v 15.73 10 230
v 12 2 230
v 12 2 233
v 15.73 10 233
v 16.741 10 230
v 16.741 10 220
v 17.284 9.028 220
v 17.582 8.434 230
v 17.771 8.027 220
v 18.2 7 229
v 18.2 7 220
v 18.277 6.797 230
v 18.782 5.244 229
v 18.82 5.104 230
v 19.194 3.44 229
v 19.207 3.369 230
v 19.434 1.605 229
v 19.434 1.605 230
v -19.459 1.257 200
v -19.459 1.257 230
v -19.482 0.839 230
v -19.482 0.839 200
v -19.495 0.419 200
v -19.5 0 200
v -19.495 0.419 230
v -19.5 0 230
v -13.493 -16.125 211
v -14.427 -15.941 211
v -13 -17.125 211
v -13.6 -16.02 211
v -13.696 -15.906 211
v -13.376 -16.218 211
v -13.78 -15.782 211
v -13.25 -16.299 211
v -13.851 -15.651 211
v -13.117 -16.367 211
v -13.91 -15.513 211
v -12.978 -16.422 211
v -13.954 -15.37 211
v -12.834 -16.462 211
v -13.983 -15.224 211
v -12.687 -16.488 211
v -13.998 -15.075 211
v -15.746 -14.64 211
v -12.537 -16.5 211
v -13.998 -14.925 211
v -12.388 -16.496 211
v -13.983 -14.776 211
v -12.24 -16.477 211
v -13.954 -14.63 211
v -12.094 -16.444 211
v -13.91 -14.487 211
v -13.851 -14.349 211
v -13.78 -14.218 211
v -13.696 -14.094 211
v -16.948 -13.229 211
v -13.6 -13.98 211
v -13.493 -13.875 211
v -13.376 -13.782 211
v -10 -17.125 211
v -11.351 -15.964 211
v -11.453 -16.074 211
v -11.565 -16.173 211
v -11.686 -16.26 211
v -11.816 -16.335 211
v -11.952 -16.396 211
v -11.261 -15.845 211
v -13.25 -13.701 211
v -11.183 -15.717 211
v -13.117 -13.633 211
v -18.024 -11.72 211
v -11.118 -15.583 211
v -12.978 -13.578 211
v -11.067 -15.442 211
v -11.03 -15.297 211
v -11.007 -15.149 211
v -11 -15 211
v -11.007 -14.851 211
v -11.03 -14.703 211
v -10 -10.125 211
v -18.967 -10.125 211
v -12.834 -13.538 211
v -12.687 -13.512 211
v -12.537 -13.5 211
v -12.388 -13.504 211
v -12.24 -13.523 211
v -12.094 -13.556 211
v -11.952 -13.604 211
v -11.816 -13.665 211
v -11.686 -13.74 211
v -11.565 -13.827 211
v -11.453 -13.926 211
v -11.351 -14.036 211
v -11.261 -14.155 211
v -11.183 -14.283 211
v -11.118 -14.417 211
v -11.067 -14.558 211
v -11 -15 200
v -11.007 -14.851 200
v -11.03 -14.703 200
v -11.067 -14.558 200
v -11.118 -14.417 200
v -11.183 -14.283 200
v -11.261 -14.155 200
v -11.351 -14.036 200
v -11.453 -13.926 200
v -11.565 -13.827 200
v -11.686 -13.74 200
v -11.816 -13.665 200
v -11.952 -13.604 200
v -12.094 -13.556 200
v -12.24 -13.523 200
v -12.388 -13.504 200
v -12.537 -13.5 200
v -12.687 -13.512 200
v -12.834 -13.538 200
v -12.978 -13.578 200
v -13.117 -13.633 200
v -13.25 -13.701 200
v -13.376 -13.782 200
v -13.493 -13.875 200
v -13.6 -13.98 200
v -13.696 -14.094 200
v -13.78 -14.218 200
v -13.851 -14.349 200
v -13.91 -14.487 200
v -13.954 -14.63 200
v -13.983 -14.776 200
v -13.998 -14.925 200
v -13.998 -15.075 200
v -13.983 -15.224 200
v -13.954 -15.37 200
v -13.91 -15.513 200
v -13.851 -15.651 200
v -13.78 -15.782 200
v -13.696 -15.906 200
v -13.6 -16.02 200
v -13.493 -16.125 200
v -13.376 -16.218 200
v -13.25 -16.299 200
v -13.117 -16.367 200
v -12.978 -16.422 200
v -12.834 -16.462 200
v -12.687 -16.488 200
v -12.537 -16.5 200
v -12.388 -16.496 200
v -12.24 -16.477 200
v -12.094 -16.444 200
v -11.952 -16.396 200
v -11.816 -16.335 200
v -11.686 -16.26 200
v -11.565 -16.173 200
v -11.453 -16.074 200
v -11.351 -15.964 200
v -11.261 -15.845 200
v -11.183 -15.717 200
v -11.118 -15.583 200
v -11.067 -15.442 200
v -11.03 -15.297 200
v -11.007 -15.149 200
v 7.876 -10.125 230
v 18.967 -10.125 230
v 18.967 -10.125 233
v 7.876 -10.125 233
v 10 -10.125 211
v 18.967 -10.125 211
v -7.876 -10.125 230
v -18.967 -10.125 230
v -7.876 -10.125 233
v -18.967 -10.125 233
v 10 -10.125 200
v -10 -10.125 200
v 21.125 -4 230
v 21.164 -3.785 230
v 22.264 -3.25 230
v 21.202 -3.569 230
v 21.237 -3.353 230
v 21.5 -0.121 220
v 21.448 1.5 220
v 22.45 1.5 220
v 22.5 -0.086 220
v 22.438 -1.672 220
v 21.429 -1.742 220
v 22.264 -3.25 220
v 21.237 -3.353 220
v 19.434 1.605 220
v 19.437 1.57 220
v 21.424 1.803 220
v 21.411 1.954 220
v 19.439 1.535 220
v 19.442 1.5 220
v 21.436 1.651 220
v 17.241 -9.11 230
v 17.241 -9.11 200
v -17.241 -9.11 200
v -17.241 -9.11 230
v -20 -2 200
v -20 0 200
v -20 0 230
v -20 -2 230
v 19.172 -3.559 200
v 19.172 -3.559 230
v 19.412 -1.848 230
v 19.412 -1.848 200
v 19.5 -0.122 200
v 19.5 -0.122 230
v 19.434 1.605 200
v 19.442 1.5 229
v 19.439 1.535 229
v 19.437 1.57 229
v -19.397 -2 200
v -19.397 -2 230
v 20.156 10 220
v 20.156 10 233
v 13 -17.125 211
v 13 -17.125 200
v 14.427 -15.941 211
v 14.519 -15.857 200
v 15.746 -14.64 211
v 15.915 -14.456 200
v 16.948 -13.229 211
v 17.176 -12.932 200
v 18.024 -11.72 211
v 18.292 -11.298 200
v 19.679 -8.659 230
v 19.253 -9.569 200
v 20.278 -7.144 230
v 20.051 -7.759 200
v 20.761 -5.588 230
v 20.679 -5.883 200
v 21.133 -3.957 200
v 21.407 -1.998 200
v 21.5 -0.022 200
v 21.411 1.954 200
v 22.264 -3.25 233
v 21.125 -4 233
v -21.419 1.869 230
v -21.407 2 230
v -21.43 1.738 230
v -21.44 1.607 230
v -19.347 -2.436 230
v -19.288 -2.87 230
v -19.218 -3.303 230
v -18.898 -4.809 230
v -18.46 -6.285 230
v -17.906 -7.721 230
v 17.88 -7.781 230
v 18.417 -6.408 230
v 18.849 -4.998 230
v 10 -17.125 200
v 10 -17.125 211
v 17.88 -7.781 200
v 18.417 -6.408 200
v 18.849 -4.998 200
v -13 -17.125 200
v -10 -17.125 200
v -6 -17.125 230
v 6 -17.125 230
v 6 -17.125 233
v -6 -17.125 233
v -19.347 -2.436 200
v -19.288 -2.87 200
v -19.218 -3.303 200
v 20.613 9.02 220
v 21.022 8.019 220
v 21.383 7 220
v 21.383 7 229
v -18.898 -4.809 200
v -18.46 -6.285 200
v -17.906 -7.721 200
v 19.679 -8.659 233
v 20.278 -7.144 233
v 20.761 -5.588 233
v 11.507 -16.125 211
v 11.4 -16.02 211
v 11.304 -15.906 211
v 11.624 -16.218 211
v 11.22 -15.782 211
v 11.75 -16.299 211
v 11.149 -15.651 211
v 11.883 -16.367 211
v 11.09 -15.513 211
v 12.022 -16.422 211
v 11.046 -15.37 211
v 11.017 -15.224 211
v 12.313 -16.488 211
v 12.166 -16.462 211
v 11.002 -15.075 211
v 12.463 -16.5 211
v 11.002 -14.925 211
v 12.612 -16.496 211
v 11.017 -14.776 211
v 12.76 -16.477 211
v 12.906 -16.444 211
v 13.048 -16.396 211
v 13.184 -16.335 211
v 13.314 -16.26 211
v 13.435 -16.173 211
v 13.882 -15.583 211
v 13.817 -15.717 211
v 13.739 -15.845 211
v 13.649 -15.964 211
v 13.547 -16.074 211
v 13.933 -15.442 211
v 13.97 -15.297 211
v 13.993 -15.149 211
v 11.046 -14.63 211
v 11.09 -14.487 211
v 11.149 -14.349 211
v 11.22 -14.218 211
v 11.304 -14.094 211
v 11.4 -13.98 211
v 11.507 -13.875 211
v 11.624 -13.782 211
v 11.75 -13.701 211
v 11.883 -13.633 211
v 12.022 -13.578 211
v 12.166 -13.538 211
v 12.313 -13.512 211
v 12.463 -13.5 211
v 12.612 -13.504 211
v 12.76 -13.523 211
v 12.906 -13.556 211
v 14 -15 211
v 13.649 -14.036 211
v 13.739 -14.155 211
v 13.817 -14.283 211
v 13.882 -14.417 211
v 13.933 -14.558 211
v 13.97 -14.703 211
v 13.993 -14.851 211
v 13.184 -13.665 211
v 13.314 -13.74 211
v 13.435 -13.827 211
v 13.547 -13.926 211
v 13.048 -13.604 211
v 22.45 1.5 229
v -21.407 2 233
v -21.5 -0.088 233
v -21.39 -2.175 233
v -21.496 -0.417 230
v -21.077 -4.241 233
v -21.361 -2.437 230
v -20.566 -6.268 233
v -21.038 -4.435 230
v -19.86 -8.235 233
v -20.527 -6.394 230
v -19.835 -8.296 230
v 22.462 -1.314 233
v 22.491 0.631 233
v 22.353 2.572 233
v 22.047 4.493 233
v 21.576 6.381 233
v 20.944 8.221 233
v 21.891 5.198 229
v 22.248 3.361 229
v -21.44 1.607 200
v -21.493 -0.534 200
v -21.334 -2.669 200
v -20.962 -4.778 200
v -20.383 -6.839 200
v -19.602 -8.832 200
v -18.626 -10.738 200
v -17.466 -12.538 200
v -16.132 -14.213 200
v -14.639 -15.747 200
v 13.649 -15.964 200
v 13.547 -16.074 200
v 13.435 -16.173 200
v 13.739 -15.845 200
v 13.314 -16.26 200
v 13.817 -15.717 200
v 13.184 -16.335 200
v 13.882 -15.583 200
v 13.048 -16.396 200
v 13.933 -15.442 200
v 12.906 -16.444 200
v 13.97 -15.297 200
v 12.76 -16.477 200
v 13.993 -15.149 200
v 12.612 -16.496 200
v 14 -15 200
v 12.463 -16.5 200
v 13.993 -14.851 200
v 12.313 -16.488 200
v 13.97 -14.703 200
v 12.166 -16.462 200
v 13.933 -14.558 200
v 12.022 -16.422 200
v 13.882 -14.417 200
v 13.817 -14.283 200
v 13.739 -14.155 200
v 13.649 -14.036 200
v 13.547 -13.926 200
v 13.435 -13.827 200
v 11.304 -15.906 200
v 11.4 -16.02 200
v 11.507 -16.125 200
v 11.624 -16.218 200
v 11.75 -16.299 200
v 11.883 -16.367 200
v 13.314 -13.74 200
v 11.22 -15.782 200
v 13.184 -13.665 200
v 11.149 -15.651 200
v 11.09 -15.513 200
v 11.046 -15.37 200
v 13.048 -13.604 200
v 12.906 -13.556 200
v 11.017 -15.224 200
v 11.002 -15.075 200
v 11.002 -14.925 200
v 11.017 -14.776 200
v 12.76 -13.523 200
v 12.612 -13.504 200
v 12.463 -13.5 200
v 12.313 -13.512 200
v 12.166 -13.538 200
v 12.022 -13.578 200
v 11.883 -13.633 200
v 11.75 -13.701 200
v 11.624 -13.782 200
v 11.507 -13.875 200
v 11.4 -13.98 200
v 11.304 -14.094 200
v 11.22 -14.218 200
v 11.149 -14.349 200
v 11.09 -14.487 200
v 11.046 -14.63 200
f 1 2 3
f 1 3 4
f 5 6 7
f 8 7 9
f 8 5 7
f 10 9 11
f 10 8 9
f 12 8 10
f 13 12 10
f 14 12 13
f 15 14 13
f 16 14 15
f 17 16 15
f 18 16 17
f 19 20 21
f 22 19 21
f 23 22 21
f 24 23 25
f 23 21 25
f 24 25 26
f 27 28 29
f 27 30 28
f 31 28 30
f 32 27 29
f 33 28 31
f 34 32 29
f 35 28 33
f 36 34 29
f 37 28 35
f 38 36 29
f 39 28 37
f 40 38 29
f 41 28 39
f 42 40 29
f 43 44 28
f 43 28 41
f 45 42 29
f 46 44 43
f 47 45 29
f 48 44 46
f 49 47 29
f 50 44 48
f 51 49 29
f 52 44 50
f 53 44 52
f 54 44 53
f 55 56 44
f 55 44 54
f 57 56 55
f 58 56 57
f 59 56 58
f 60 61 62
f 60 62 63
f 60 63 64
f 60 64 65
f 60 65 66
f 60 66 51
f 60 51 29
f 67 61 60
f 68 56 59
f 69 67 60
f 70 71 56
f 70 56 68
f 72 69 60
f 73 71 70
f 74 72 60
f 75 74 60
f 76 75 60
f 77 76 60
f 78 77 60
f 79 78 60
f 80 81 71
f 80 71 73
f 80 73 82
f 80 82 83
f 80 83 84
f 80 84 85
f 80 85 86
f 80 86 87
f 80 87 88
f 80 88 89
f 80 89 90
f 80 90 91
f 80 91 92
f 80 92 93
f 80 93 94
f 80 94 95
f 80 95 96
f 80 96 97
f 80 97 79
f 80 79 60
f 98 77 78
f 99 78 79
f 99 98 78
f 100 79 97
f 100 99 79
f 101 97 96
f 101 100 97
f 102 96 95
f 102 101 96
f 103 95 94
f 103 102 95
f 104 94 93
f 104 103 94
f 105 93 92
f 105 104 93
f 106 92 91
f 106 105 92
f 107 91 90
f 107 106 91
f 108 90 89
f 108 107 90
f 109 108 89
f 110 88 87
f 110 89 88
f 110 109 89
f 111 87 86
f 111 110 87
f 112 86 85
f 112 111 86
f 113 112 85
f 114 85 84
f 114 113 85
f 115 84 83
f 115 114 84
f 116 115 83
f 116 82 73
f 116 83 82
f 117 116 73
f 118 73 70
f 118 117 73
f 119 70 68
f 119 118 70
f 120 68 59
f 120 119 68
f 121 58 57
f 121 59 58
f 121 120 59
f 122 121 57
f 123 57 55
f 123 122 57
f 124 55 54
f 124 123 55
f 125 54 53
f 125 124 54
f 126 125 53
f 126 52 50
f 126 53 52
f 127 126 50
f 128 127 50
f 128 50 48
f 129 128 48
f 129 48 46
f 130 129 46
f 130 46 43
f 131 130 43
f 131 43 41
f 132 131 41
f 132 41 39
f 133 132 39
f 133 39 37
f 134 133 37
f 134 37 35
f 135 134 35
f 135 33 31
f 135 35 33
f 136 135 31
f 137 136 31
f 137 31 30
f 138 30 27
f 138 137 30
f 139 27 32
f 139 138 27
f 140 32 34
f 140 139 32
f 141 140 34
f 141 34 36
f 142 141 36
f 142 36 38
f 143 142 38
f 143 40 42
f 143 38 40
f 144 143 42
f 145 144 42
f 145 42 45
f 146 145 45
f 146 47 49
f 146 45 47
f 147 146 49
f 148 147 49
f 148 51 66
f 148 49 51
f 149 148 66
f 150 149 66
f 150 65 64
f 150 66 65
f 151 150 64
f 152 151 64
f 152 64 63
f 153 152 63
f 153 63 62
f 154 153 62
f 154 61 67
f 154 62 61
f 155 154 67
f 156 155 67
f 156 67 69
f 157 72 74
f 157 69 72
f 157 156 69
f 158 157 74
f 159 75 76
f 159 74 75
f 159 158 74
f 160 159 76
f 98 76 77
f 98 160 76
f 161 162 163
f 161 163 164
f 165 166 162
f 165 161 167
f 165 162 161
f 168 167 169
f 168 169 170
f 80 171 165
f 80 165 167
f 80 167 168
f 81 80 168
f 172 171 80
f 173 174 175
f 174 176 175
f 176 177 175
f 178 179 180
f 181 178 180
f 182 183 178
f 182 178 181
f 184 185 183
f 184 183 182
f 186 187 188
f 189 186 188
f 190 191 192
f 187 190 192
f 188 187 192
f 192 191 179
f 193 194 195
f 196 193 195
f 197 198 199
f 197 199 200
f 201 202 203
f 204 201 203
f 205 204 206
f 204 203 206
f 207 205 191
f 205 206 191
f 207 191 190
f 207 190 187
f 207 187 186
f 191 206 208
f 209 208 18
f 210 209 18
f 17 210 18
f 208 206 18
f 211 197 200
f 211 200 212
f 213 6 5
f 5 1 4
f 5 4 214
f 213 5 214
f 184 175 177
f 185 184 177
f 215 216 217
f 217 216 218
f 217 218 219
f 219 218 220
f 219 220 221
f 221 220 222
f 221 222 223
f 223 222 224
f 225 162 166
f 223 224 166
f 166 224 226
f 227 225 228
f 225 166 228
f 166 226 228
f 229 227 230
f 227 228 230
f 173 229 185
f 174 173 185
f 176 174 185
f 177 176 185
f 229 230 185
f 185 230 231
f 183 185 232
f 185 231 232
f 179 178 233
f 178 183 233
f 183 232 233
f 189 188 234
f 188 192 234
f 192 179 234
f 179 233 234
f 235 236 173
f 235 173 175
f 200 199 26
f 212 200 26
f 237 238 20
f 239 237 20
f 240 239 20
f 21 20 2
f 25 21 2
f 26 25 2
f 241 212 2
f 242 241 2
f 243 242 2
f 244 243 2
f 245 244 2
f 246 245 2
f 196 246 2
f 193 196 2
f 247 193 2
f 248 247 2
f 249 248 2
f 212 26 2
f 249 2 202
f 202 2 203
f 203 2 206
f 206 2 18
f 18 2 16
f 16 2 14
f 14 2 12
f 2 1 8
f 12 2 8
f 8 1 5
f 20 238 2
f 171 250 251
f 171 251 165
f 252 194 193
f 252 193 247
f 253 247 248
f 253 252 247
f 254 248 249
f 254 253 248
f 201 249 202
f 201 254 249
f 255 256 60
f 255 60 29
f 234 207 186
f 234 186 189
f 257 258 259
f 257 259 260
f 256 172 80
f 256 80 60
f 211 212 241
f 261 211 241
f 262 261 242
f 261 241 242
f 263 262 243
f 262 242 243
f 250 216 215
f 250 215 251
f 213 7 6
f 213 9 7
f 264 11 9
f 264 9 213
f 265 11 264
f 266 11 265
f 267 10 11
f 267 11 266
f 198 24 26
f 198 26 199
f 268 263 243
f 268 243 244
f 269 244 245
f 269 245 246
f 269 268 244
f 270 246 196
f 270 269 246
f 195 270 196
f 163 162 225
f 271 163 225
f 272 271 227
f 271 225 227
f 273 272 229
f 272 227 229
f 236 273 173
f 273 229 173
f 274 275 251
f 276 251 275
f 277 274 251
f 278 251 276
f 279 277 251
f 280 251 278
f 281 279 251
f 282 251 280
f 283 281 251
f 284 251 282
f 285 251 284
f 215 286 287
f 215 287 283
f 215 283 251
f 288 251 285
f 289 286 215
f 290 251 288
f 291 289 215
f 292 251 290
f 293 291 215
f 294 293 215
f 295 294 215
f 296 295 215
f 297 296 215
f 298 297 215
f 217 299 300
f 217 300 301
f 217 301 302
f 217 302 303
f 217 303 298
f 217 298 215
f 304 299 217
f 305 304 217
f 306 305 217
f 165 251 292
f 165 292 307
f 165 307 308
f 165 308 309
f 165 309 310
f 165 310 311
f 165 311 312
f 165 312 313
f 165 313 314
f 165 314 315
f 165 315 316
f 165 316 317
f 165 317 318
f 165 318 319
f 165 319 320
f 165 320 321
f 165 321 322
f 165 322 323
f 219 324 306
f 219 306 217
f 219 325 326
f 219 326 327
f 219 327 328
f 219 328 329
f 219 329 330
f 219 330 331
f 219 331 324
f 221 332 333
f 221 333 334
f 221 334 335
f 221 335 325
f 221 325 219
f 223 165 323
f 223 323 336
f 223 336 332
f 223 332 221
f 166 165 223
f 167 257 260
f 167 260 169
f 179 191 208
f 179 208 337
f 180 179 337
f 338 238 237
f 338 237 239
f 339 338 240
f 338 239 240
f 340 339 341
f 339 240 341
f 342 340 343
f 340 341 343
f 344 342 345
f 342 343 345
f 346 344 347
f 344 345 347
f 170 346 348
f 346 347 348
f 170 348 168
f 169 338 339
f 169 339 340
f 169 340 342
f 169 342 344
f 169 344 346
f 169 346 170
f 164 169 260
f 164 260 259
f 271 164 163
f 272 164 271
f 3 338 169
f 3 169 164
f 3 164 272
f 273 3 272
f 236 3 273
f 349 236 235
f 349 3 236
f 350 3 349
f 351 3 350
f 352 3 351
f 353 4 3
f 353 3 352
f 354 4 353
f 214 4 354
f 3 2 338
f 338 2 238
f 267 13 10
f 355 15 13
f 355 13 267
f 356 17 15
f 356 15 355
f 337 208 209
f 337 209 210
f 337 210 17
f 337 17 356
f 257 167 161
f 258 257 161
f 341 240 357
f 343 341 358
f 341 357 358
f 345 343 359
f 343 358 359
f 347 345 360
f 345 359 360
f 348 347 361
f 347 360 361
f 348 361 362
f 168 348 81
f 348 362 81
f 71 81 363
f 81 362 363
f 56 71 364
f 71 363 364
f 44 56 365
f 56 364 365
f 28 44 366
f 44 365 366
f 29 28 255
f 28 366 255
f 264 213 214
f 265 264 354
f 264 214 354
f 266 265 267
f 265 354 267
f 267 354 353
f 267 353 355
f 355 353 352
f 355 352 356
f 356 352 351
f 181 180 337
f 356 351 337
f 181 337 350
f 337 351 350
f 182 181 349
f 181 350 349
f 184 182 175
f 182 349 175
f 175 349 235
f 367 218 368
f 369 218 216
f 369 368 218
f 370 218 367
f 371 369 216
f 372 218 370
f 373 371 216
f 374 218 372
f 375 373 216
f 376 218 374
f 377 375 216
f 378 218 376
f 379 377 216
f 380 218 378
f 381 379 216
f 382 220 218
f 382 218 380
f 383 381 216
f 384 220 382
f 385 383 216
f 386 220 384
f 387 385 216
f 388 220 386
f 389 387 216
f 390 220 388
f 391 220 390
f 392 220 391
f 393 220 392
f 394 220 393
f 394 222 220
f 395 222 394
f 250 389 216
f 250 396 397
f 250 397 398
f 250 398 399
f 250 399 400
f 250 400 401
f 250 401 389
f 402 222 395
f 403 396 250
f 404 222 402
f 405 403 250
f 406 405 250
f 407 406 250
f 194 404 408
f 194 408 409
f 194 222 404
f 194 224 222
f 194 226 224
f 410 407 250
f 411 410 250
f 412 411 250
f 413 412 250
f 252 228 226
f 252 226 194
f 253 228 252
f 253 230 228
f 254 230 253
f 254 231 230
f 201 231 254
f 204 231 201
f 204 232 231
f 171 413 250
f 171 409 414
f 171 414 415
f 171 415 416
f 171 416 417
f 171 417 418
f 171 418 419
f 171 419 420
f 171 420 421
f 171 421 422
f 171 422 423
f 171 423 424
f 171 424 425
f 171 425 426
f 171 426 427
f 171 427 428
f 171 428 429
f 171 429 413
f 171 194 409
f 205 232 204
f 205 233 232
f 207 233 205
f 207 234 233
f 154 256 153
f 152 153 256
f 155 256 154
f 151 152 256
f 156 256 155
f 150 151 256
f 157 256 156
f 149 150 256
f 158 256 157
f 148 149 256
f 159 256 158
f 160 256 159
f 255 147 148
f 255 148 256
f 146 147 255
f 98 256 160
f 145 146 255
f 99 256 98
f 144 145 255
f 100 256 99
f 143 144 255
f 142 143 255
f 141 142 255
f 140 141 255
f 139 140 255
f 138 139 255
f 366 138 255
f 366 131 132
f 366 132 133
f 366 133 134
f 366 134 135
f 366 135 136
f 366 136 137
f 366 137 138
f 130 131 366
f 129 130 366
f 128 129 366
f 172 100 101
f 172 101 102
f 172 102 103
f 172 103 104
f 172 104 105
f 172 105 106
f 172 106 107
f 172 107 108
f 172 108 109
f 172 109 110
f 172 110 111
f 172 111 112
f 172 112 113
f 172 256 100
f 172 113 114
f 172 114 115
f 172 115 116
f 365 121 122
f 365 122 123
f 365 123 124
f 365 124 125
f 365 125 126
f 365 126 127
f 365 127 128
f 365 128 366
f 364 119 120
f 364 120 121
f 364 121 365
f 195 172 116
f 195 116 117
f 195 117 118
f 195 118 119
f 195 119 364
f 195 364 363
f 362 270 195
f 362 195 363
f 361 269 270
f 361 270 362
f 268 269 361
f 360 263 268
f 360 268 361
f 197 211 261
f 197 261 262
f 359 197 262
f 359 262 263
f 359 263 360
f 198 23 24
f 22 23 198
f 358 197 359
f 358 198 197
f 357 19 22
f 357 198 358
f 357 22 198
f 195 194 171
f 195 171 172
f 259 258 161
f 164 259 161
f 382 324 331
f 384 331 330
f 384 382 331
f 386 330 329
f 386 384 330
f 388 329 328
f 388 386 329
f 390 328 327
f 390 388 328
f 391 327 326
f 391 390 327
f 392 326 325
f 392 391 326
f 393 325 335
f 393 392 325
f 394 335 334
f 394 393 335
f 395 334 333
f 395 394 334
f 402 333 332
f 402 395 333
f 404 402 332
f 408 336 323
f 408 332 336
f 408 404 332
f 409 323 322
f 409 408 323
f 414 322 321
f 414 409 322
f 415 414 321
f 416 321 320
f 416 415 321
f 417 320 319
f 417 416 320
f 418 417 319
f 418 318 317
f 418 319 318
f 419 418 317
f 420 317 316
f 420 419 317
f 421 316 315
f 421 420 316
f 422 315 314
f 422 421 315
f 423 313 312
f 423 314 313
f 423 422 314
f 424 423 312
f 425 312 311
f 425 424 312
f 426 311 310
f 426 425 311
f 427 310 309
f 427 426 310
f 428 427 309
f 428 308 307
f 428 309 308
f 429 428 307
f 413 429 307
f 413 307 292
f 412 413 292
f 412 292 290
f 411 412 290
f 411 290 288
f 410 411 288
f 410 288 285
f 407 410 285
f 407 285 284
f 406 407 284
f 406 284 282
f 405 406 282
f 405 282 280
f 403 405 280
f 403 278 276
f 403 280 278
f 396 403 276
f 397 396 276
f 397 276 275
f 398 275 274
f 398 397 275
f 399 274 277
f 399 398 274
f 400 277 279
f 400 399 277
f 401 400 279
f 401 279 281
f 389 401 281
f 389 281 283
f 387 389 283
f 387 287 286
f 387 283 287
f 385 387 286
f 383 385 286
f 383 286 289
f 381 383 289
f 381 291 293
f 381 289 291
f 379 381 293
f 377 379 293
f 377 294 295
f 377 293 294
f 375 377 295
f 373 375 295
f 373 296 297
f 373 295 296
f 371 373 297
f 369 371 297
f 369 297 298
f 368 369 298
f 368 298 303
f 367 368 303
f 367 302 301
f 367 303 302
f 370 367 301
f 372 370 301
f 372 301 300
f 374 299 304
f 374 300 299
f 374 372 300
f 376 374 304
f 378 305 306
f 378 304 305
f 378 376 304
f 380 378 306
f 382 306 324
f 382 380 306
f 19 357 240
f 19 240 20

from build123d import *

# Parameters (mm, degrees)
SKETCH046_R     = 1.5
PAD026_DEPTH    = 30
POCKET016_DEPTH = 19
POCKET017_DEPTH = 50
PAD027_DEPTH    = 3
PAD028_DEPTH    = 10
SKETCH054_W     = 30
SKETCH054_H     = 5.5
POCKET020_DEPTH = 9


with BuildPart() as part:
    # Sketch046 → Pad026 (new body)
    with BuildSketch(Plane.XY):
        with BuildLine():
            Line((-21.439893, 1.606546), (-18, 1))
            Line((-18, 1), (-18, 0))
            Line((-18, 0), (-20, 0))
            Line((-20, 0), (-20, -2))
            Line((-20, -2), (-18, -2))
            Line((-18, -2), (-18, -3))
            Line((-19.218253, -3.302841), (-18, -3))
            ThreePointArc((-19.218253, -3.302841), (-18.4595, -6.284654), (-17.241169, -9.11))
            Line((17.241169, -9.11), (-17.241169, -9.11))
            ThreePointArc((17.241169, -9.11), (18.417093, -6.407863), (19.172397, -3.559379))
            Line((19.172397, -3.559379), (16, -3))
            Line((16, -3), (16, -2))
            Line((16, -2), (18, -2))
            Line((18, -2), (18, 0))
            Line((18, 0), (16, 0))
            Line((16, 0), (16, 1))
            Line((16, 1), (21.411013, 1.954108))
            ThreePointArc((13, -17.124544), (19.673032, -8.673051), (21.411013, 1.954108))
            Line((13, -17.124544), (10, -17.124544))
            Line((10, -17.124544), (10, -10.124544))
            Line((10, -10.124544), (-10, -10.124544))
            Line((-10, -10.124544), (-10, -17.124544))
            Line((-10, -17.124544), (-13, -17.124544))
            ThreePointArc((-21.439893, 1.606546), (-19.60204, -8.832328), (-13, -17.124544))
        make_face()
        with Locations((-12.5, -15)):
            Circle(SKETCH046_R, mode=Mode.SUBTRACT)
        with Locations((12.5, -15)):
            Circle(SKETCH046_R, mode=Mode.SUBTRACT)
    extrude(amount=PAD026_DEPTH)

    # Sketch047 (on Face28 of Pad026) → Pocket016 (cut)
    with BuildSketch(Plane.XY.offset(30)):
        with BuildLine():
            ThreePointArc((-18.966908, -10.124544), (-16.362176, -13.947372), (-13, -17.124544))
            Line((-13, -17.124544), (13, -17.124544))
            ThreePointArc((13, -17.124544), (16.362176, -13.947372), (18.966908, -10.124544))
            Line((-18.966908, -10.124544), (18.966908, -10.124544))
        make_face()
    extrude(amount=-POCKET016_DEPTH, mode=Mode.SUBTRACT)

    # Sketch049 (on Face5 of Pocket016) → Pocket017 (cut)
    with BuildSketch(Plane.XY.offset(30)):
        with BuildLine():
            ThreePointArc((19.172397, -3.559379), (0, 19.5), (-19.172397, -3.559379))
            Line((19.172397, -3.559379), (-19.172397, -3.559379))
        make_face()
    extrude(amount=-POCKET017_DEPTH, mode=Mode.SUBTRACT)

    # Sketch048 (on Face5 of Pocket016) → Pad027 (join)
    with BuildSketch(Plane.XY.offset(30)):
        with BuildLine():
            ThreePointArc((-21.406775, 2), (-21.077469, -4.241496), (-18.966908, -10.124544))
            Line((-7.875644, -10.124544), (-18.966908, -10.124544))
            Line((-6, -17.124544), (-7.875644, -10.124544))
            Line((6, -17.124544), (-6, -17.124544))
            Line((6, -17.124544), (7.875644, -10.124544))
            Line((7.875644, -10.124544), (18.966908, -10.124544))
            ThreePointArc((18.966908, -10.124544), (20.278323, -7.144202), (21.12463, -4))
            Line((21.12463, -4), (22.264041, -3.25))
            ThreePointArc((22.264041, -3.25), (22.220442, 3.535811), (20.155644, 10))
            Line((15.730461, 10), (20.155644, 10))
            Line((12, 2), (15.730461, 10))
            Line((12, 2), (-21.406775, 2))
        make_face()
    extrude(amount=PAD027_DEPTH)

    # Sketch053 (on Face4 of Pad027) → Pad028 (join)
    with BuildSketch(Plane(origin=(0, 0, 30), x_dir=(1, 0, 0), z_dir=(0, 0, -1))):
        with BuildLine():
            ThreePointArc((20.155644, -10), (22.220442, -3.535811), (22.264041, 3.25))
            Line((22.264041, 3.25), (19.172397, 3.559379))
            ThreePointArc((16.740669, -10), (19.193782, -3.442198), (19.172397, 3.559379))
            Line((16.740669, -10), (20.155644, -10))
        make_face()
    extrude(amount=PAD028_DEPTH)

    # Sketch054 (on Face32 of Pad028) → Pocket020 (cut)
    with BuildSketch(Plane(origin=(0, 0, 20), x_dir=(1, 0, 0), z_dir=(0, 0, -1))):
        with Locations((15, -4.25)):
            Rectangle(SKETCH054_W, SKETCH054_H)
    extrude(amount=-POCKET020_DEPTH, mode=Mode.SUBTRACT)


with BuildPart() as part_1:
    # Body018 placement: moved
    add(part.part.moved(Location((0, 0, 200))))


solid = part_1.part
